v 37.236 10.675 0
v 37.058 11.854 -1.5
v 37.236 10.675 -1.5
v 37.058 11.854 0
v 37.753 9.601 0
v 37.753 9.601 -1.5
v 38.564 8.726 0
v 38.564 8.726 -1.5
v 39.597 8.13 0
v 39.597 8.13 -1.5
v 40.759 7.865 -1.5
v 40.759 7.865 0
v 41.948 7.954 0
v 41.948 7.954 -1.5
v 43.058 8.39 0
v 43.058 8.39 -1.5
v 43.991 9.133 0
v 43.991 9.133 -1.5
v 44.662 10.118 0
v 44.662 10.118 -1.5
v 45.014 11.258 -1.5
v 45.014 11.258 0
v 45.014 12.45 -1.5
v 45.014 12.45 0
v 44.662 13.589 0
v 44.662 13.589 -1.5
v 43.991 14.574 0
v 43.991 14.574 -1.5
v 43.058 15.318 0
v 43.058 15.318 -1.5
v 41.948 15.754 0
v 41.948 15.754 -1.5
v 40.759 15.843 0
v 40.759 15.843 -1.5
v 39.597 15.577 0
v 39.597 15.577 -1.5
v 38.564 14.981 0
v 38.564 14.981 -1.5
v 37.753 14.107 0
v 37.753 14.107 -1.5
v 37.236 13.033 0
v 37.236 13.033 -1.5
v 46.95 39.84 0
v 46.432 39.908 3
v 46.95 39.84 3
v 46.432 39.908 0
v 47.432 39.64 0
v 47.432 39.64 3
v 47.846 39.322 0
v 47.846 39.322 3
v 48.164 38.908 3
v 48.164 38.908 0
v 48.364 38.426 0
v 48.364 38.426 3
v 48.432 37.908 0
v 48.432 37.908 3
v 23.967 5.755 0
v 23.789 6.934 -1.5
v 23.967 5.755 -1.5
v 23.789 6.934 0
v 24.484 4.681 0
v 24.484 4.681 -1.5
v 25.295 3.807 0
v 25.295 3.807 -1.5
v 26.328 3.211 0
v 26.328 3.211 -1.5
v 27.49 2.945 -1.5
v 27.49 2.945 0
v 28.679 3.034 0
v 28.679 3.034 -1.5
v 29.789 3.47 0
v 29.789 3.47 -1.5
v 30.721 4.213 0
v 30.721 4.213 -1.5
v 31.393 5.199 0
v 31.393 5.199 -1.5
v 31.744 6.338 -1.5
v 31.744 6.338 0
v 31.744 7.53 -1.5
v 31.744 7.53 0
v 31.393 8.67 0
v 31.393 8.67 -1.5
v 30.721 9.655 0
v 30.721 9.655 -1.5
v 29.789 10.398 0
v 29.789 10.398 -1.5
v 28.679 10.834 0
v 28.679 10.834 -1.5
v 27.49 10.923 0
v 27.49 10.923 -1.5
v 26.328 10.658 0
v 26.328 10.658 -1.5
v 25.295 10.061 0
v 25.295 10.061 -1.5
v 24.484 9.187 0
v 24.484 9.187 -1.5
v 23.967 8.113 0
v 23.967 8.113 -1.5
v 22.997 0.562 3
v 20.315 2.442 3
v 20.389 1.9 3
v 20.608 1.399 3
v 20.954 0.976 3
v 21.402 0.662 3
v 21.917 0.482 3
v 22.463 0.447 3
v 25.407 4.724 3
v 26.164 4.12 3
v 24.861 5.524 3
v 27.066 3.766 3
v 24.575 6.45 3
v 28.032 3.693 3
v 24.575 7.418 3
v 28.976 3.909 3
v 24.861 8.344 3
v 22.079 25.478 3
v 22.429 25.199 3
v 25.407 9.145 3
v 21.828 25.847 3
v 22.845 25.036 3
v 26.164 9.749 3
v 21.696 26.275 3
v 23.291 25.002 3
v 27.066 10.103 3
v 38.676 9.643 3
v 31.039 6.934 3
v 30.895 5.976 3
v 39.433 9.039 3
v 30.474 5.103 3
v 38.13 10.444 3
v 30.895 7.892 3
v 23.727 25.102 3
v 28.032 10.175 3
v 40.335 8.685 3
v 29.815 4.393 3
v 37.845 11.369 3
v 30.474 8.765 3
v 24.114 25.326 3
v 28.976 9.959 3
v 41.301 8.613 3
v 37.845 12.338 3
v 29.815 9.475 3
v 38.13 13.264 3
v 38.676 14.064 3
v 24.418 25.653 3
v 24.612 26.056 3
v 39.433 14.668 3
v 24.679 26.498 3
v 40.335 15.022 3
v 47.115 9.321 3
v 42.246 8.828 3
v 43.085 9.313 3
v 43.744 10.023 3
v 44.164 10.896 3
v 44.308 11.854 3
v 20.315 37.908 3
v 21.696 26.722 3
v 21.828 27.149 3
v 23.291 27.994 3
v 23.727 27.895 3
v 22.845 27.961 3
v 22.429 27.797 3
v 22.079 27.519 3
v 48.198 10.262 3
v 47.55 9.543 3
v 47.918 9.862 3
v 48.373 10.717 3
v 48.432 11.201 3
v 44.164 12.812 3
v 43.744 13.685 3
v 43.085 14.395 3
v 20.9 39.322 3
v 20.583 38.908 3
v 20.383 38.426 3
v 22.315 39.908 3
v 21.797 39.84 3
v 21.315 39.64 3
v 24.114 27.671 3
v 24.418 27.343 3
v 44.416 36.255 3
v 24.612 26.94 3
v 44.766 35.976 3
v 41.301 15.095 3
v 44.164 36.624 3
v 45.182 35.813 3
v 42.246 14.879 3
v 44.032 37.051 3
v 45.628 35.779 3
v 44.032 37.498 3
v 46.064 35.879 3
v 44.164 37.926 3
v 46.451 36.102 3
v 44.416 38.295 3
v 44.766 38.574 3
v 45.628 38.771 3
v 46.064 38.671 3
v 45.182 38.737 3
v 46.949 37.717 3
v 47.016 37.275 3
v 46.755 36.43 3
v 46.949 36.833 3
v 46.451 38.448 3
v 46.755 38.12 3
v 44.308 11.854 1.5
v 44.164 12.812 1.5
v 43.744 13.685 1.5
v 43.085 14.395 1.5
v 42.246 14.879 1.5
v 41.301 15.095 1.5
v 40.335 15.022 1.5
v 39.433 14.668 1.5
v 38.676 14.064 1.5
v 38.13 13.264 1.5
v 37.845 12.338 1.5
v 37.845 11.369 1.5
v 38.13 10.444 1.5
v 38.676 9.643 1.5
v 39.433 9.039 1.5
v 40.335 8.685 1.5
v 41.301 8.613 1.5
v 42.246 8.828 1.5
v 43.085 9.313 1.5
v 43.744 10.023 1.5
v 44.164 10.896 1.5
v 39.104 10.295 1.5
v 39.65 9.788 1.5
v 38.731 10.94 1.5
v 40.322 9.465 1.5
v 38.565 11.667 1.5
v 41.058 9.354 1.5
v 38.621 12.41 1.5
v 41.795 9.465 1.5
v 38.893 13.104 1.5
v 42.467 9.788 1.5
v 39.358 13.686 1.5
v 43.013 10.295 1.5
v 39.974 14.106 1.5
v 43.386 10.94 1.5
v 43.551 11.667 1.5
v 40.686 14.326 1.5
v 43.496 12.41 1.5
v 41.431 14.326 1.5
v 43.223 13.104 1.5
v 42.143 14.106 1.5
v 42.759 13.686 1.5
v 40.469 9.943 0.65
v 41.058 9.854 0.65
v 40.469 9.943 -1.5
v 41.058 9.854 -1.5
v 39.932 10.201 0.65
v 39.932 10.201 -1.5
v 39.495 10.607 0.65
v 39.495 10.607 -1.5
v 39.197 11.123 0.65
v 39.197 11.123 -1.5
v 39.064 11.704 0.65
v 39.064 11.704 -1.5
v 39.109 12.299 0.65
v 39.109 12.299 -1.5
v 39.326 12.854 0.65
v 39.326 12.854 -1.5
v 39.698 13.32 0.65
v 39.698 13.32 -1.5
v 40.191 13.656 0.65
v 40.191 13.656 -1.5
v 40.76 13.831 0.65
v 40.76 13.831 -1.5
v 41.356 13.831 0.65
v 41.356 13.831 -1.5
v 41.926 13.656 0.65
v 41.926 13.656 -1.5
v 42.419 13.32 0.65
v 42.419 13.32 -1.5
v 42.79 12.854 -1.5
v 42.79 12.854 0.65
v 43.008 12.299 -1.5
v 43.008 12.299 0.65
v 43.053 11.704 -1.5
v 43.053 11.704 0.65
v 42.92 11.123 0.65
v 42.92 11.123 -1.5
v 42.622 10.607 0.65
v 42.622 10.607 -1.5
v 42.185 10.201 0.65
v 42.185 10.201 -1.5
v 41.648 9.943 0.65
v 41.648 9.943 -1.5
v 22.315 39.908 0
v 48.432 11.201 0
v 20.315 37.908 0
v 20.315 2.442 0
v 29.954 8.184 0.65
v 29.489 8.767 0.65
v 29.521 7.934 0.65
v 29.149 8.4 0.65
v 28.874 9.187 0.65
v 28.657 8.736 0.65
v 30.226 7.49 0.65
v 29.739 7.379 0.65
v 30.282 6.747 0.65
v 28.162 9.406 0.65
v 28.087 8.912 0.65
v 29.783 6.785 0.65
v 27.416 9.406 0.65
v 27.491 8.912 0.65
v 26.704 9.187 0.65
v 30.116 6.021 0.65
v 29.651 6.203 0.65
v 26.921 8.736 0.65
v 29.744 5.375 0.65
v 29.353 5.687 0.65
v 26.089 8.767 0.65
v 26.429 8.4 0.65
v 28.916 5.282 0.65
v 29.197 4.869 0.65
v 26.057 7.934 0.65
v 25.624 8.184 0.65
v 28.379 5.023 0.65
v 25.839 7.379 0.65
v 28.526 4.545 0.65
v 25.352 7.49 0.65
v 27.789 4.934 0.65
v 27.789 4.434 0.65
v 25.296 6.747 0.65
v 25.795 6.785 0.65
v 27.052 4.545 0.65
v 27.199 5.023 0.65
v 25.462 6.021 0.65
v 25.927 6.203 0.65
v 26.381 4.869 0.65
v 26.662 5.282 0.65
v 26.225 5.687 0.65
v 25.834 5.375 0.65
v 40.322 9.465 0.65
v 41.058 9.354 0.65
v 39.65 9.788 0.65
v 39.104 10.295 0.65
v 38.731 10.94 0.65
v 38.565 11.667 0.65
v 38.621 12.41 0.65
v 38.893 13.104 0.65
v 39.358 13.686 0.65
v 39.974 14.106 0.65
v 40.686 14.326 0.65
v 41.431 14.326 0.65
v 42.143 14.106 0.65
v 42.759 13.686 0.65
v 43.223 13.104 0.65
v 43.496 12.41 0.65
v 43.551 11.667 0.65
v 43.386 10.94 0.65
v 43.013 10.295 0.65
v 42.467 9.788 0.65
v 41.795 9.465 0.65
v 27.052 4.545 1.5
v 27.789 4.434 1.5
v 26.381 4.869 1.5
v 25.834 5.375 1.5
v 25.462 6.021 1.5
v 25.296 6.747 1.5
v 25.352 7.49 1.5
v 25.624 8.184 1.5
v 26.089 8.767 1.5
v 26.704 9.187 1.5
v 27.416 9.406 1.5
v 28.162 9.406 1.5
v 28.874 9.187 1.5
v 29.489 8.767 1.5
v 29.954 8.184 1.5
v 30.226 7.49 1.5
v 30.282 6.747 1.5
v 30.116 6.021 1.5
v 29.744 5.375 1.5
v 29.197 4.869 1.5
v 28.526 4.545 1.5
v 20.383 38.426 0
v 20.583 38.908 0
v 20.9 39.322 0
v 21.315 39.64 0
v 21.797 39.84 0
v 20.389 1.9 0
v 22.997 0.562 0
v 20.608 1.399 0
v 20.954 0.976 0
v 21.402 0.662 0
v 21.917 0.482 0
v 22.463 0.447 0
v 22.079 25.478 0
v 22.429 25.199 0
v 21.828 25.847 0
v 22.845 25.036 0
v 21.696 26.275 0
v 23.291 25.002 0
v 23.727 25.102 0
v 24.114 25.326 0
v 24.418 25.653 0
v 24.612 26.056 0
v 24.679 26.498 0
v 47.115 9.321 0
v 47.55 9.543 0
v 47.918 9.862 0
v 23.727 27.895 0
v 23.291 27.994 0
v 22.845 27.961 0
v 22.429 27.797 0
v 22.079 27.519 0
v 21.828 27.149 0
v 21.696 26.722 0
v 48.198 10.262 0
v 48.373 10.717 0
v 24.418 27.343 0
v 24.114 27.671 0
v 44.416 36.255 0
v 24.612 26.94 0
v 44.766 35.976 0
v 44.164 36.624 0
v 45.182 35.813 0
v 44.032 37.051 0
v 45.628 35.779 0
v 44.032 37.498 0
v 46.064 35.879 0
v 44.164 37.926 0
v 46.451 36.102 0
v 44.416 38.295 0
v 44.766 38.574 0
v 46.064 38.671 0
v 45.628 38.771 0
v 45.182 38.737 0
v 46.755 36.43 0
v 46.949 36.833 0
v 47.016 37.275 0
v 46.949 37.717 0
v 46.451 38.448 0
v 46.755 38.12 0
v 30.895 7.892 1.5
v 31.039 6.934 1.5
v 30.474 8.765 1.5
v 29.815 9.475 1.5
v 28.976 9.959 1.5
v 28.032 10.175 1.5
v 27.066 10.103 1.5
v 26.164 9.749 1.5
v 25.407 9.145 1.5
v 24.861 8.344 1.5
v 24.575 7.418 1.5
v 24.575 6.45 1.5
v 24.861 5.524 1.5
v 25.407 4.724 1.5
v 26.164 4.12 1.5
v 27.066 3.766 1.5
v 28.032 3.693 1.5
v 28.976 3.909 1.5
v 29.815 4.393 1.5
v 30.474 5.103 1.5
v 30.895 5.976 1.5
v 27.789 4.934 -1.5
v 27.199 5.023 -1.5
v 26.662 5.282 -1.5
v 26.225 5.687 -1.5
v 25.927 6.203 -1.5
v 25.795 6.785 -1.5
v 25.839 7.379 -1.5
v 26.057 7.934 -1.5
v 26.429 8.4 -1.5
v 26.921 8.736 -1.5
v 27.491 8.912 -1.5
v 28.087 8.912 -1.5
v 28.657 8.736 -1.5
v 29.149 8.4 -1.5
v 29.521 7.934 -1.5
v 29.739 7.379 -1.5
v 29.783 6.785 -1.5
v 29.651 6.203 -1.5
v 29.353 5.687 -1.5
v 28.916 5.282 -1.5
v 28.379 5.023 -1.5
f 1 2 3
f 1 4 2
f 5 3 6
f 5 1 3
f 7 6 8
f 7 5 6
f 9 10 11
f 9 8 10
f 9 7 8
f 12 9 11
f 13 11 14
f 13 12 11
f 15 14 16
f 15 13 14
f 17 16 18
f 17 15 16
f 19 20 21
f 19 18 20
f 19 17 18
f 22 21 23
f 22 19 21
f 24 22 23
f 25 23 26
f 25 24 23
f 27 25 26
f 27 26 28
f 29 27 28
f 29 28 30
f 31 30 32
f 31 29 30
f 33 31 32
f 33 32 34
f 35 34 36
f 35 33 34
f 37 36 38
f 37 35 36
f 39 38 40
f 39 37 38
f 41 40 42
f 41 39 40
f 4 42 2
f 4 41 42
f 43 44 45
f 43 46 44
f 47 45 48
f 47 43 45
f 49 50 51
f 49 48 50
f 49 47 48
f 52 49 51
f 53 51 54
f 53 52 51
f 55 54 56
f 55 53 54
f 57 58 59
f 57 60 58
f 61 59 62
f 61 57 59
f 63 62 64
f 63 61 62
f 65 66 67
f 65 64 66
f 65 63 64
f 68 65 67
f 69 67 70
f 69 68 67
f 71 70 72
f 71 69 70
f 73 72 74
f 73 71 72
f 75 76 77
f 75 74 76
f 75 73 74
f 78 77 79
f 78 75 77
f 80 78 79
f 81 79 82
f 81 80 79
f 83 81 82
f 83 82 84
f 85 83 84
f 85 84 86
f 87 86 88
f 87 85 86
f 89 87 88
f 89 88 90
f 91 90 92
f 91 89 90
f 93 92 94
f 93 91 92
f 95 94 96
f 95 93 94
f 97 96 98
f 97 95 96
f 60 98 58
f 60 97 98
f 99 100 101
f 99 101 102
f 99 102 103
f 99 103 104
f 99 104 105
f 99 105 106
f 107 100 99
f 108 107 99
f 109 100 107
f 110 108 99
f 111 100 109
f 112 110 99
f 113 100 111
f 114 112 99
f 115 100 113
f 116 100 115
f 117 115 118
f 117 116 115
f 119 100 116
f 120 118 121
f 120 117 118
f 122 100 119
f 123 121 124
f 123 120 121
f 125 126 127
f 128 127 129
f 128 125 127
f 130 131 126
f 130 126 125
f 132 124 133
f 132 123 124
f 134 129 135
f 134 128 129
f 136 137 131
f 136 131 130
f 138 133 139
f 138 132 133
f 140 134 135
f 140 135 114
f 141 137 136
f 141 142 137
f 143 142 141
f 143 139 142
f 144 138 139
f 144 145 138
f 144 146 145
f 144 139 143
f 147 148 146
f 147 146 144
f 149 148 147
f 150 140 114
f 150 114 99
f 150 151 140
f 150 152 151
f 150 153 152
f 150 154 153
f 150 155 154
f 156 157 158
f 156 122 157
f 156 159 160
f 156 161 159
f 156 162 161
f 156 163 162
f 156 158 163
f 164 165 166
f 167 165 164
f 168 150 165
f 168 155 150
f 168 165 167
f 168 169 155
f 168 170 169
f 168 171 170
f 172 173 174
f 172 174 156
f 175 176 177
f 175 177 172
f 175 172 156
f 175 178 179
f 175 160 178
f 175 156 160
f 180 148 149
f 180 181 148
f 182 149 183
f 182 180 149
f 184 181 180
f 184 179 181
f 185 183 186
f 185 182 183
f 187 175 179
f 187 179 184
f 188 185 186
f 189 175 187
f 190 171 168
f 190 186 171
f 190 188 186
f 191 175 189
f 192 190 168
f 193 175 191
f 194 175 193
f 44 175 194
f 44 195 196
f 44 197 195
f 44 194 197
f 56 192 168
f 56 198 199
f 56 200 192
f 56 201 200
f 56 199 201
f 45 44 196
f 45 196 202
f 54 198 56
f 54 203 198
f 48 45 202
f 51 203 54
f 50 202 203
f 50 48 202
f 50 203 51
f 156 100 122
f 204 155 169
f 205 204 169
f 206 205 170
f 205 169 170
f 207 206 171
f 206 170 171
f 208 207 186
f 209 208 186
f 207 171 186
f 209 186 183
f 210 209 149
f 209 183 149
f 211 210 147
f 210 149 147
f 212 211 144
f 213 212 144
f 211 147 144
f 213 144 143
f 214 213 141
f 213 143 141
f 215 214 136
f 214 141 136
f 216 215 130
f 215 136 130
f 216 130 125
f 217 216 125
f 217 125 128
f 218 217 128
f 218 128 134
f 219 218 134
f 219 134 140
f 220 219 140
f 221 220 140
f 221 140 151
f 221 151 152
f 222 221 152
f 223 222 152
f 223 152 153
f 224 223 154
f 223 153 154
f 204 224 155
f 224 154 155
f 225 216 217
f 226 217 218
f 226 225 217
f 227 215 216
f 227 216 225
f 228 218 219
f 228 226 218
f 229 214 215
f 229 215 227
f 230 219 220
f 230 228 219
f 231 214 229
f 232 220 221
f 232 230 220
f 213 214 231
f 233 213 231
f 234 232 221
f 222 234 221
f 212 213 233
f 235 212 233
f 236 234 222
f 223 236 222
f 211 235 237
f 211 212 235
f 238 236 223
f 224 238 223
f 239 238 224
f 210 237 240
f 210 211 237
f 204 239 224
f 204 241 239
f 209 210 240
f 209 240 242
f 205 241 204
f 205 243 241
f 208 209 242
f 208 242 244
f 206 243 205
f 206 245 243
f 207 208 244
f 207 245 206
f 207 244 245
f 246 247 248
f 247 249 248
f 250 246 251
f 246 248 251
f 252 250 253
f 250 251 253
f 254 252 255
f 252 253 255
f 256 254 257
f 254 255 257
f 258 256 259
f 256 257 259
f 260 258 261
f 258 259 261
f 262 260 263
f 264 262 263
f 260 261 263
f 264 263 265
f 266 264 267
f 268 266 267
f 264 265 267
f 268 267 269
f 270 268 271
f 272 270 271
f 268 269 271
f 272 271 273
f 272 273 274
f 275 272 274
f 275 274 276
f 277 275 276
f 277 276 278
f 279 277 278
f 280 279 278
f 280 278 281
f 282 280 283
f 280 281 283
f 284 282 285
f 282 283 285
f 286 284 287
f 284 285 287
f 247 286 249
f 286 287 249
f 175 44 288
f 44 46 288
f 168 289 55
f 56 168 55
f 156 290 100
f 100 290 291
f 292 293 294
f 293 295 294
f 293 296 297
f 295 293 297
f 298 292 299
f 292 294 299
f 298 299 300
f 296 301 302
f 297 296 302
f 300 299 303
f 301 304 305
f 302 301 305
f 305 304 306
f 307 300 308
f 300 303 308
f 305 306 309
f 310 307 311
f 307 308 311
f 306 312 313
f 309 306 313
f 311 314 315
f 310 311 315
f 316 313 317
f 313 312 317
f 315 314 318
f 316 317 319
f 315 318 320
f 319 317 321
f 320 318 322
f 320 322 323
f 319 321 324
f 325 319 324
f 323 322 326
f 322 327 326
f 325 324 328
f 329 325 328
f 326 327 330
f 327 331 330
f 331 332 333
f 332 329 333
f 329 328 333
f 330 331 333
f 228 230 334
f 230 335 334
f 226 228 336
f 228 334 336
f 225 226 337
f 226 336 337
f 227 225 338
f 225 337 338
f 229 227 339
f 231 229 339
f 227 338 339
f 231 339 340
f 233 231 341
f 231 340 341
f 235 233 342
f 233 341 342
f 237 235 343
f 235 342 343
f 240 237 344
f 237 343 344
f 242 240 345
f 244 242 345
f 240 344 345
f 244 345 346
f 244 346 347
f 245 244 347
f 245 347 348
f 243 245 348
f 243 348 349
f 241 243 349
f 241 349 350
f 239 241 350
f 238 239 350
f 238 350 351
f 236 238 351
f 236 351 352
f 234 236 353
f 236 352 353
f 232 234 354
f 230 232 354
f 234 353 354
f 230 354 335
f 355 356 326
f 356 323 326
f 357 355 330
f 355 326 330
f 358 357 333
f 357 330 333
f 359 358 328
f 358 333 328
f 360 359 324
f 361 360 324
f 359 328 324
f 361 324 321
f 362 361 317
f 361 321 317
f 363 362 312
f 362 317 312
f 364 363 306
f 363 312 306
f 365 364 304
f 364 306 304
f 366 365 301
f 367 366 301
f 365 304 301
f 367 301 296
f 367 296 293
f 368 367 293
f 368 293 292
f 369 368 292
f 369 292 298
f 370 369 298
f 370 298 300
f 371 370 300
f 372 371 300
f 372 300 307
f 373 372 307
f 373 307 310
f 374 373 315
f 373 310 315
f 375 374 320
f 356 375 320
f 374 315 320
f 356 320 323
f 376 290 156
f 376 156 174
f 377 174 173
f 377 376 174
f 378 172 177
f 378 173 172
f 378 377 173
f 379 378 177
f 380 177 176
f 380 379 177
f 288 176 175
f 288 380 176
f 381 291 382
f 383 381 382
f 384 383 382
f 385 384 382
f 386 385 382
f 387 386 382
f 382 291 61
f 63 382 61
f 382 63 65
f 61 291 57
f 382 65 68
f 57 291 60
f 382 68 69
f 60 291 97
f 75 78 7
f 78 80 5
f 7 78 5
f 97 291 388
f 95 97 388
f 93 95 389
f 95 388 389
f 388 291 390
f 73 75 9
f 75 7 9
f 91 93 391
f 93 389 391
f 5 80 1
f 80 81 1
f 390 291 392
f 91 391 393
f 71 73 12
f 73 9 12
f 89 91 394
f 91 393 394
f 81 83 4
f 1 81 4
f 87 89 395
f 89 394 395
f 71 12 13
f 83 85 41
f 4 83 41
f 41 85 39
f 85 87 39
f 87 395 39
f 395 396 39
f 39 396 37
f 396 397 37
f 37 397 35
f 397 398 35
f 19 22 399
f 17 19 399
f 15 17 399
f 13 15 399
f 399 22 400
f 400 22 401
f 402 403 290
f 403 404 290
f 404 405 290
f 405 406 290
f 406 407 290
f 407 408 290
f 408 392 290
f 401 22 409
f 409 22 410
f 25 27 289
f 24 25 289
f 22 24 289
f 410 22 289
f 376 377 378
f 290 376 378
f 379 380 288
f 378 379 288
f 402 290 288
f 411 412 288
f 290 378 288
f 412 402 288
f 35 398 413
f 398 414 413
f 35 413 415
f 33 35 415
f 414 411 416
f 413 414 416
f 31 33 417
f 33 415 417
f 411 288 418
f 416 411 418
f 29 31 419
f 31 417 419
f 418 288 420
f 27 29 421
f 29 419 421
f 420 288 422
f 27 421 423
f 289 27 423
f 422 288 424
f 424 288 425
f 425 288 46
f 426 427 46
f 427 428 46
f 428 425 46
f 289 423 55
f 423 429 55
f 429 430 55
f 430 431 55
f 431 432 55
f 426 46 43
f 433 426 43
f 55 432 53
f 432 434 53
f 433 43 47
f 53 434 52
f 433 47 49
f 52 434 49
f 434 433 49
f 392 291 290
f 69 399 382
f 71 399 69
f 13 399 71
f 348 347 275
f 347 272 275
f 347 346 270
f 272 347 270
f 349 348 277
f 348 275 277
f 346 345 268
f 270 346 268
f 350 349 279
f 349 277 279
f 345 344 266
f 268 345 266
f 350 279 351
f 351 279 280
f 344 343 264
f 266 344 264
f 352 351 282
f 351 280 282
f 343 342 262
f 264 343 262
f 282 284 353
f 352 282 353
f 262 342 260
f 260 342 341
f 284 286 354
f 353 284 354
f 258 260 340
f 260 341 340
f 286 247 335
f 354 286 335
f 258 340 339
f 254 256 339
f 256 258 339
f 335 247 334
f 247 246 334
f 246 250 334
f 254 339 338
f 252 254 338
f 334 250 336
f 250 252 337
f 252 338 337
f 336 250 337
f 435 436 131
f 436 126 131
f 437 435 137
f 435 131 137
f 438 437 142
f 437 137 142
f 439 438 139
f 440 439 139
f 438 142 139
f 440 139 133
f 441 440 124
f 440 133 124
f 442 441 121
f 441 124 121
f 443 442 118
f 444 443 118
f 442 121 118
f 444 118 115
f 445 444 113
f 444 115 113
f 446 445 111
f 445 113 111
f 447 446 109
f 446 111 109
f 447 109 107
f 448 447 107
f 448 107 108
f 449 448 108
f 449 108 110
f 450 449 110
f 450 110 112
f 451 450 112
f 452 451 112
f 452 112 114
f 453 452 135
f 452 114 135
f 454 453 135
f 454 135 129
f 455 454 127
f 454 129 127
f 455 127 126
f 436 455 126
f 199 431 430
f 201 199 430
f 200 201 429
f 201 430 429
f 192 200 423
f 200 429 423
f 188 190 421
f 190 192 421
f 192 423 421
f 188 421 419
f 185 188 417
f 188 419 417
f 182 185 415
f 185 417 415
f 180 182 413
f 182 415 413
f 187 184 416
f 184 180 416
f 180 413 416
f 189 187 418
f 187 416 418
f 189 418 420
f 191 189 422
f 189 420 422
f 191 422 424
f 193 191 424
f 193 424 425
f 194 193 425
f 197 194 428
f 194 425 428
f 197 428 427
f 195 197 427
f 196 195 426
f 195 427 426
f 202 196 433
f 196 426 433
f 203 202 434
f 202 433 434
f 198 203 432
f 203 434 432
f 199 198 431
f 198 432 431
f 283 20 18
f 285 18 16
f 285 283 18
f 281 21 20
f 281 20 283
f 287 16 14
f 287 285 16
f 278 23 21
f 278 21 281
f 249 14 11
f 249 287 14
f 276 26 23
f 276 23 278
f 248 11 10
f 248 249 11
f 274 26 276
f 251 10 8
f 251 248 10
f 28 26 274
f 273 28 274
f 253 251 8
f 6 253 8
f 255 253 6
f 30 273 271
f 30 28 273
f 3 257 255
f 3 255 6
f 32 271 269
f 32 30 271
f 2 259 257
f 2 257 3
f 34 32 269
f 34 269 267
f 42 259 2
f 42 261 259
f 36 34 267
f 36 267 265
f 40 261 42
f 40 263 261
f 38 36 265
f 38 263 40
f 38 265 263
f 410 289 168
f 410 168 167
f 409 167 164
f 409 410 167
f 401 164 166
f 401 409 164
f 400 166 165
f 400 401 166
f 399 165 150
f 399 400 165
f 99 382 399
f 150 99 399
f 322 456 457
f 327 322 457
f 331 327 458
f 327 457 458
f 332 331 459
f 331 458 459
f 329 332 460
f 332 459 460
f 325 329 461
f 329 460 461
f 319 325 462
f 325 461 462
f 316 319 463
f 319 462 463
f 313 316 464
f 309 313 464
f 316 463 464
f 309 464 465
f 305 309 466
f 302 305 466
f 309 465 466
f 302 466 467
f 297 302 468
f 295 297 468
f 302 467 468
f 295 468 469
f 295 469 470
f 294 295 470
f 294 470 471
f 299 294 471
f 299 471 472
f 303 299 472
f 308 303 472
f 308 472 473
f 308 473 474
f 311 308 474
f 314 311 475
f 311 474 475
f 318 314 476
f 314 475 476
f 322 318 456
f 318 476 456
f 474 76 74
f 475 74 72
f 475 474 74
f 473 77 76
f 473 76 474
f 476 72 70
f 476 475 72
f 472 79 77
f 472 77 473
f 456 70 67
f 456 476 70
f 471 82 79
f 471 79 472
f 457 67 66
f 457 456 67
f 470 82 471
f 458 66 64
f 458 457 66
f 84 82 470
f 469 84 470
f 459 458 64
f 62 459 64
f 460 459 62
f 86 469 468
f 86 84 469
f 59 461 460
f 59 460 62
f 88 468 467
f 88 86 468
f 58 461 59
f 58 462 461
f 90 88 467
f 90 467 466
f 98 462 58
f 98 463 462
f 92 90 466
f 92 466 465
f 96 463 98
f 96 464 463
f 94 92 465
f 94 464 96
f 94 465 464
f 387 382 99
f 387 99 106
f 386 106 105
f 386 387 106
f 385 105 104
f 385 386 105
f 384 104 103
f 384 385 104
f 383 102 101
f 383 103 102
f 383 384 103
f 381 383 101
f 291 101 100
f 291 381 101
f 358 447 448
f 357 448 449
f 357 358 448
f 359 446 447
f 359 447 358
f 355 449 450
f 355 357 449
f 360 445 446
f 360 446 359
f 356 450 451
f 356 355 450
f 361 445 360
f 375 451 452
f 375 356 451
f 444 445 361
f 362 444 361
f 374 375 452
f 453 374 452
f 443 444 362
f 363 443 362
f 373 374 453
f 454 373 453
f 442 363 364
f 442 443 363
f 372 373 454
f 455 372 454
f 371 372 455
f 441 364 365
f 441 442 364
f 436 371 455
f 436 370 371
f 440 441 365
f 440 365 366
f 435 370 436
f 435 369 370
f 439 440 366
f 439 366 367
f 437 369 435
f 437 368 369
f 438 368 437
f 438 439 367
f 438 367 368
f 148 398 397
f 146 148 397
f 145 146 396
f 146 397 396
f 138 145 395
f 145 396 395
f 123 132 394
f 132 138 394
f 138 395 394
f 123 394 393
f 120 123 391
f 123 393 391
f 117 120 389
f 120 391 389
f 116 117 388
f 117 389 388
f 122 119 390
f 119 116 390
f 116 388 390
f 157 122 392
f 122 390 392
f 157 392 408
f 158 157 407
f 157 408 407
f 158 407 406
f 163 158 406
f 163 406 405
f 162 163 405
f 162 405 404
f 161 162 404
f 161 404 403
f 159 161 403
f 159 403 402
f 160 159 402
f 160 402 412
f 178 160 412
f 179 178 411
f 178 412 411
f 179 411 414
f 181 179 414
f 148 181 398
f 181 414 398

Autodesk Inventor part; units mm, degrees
ref_plane "YZ Plane" through (0, 0, 0) normal (1, 0, 0) x (0, 1, 0)
ref_plane "XZ Plane" through (0, 0, 0) normal (0, 1, 0) x (-1, 0, 0)
ref_plane "XY Plane" through (0, 0, 0) normal (0, 0, 1) x (1, 0, 0)
sketch "Sketch1" plane through (0, 0, 0) normal (0, 0, 1) x (1, 0, 0)
  line L0 (0, 61.5875) -> (62, 61.5875) construction
  line L1 (62, 61.5875) -> (62, -0.4125) construction
  line L2 (62, -0.4125) -> (0, -0.4125) construction
  line L3 (0, -0.4125) -> (0, 61.5875) construction
  line L4 (48.4322, 11.2012) -> (48.4322, 37.9079)
  line L5 (20.3147, 37.9079) -> (20.3147, 2.4417)
  line L6 (24.0433, 39.9079) -> (22.3147, 39.9079)
  line L7 (46.4322, 39.9079) -> (24.0433, 39.9079)
  arc A0 (22.3147, 39.9079) -> (20.3147, 37.9079) centre (22.3147, 37.9079) ccw
  circle A1 centre (23.179, 26.4983) radius 1.5
  circle A2 centre (45.5157, 37.2749) radius 1.5
  line L8 (16.613, -7.1773) -> (55.7088, 13.6823) projected
  line L9 (22.9974, 0.5619) -> (47.1149, 9.3214)
  arc A3 (20.3147, 2.4417) -> (22.9974, 0.5619) centre (22.3147, 2.4417) ccw
  arc A4 (47.1149, 9.3214) -> (48.4322, 11.2012) centre (46.4322, 11.2012) ccw
  arc A5 (48.4322, 37.9079) -> (46.4322, 39.9079) centre (46.4322, 37.9079) ccw
  point P0 (0, 0)
  point P1 (48.4322, 39.9079)
  point P2 (48.4322, 9.7998)
  point P3 (20.3147, -0.4125)
  dimension "d9" = 62
  dimension "d18" = 2
  dimension "d19" = 3
  dimension "d20" = 3
  dimension "d27" = 28.1175
  dimension "d47" = 2
extrude "Extrusion2" add sketch "Sketch1" along normal blind 3
sketch "Sketch3" plane through (0, 0, 0) normal (0, 0, -1) x (-1, 0, 0)
  circle A0 centre (-41.0584, 11.8538) radius 4
  circle A1 centre (-27.789, 6.9341) radius 4
  point P0 (0, 0)
  dimension "d51" = 8
  dimension "d52" = 8
extrude "Extrusion4" add sketch "Sketch3" along normal blind 1.5
sketch "Sketch4" plane through (0, 0, 3) normal (0, 0, 1) x (1, 0, 0)
  circle A0 centre (27.789, 6.9341) radius 4 projected
  circle A1 centre (41.0584, 11.8538) radius 4 projected
  circle A2 centre (41.0584, 11.8538) radius 3.25
  circle A3 centre (27.789, 6.9341) radius 3.25
  point P0 (0, 0)
  dimension "d55" = 6.5
  dimension "d56" = 6.5
extrude "Extrusion5" cut sketch "Sketch4" against normal blind 1.5 contours A2 | A3
sketch "Sketch5" plane through (41.0584, 11.8538, 1.5) normal (0, 0, 1) x (1, 0, 0)
  circle A0 centre (-13.2694, -4.9197) radius 3.25 projected
  circle A1 centre (0, 0) radius 3.25 projected
  point P0 (-41.0584, -11.8538)
hole "Hole1" at (27.789, 6.9341, 1.5) at (41.0584, 11.8538, 1.5) direction (0, 0, -1) diameter 4 depth 3 tip angle 118 counterbore diameter 5 counterbore depth 0.85
properties part number "bump_switch_mount"
